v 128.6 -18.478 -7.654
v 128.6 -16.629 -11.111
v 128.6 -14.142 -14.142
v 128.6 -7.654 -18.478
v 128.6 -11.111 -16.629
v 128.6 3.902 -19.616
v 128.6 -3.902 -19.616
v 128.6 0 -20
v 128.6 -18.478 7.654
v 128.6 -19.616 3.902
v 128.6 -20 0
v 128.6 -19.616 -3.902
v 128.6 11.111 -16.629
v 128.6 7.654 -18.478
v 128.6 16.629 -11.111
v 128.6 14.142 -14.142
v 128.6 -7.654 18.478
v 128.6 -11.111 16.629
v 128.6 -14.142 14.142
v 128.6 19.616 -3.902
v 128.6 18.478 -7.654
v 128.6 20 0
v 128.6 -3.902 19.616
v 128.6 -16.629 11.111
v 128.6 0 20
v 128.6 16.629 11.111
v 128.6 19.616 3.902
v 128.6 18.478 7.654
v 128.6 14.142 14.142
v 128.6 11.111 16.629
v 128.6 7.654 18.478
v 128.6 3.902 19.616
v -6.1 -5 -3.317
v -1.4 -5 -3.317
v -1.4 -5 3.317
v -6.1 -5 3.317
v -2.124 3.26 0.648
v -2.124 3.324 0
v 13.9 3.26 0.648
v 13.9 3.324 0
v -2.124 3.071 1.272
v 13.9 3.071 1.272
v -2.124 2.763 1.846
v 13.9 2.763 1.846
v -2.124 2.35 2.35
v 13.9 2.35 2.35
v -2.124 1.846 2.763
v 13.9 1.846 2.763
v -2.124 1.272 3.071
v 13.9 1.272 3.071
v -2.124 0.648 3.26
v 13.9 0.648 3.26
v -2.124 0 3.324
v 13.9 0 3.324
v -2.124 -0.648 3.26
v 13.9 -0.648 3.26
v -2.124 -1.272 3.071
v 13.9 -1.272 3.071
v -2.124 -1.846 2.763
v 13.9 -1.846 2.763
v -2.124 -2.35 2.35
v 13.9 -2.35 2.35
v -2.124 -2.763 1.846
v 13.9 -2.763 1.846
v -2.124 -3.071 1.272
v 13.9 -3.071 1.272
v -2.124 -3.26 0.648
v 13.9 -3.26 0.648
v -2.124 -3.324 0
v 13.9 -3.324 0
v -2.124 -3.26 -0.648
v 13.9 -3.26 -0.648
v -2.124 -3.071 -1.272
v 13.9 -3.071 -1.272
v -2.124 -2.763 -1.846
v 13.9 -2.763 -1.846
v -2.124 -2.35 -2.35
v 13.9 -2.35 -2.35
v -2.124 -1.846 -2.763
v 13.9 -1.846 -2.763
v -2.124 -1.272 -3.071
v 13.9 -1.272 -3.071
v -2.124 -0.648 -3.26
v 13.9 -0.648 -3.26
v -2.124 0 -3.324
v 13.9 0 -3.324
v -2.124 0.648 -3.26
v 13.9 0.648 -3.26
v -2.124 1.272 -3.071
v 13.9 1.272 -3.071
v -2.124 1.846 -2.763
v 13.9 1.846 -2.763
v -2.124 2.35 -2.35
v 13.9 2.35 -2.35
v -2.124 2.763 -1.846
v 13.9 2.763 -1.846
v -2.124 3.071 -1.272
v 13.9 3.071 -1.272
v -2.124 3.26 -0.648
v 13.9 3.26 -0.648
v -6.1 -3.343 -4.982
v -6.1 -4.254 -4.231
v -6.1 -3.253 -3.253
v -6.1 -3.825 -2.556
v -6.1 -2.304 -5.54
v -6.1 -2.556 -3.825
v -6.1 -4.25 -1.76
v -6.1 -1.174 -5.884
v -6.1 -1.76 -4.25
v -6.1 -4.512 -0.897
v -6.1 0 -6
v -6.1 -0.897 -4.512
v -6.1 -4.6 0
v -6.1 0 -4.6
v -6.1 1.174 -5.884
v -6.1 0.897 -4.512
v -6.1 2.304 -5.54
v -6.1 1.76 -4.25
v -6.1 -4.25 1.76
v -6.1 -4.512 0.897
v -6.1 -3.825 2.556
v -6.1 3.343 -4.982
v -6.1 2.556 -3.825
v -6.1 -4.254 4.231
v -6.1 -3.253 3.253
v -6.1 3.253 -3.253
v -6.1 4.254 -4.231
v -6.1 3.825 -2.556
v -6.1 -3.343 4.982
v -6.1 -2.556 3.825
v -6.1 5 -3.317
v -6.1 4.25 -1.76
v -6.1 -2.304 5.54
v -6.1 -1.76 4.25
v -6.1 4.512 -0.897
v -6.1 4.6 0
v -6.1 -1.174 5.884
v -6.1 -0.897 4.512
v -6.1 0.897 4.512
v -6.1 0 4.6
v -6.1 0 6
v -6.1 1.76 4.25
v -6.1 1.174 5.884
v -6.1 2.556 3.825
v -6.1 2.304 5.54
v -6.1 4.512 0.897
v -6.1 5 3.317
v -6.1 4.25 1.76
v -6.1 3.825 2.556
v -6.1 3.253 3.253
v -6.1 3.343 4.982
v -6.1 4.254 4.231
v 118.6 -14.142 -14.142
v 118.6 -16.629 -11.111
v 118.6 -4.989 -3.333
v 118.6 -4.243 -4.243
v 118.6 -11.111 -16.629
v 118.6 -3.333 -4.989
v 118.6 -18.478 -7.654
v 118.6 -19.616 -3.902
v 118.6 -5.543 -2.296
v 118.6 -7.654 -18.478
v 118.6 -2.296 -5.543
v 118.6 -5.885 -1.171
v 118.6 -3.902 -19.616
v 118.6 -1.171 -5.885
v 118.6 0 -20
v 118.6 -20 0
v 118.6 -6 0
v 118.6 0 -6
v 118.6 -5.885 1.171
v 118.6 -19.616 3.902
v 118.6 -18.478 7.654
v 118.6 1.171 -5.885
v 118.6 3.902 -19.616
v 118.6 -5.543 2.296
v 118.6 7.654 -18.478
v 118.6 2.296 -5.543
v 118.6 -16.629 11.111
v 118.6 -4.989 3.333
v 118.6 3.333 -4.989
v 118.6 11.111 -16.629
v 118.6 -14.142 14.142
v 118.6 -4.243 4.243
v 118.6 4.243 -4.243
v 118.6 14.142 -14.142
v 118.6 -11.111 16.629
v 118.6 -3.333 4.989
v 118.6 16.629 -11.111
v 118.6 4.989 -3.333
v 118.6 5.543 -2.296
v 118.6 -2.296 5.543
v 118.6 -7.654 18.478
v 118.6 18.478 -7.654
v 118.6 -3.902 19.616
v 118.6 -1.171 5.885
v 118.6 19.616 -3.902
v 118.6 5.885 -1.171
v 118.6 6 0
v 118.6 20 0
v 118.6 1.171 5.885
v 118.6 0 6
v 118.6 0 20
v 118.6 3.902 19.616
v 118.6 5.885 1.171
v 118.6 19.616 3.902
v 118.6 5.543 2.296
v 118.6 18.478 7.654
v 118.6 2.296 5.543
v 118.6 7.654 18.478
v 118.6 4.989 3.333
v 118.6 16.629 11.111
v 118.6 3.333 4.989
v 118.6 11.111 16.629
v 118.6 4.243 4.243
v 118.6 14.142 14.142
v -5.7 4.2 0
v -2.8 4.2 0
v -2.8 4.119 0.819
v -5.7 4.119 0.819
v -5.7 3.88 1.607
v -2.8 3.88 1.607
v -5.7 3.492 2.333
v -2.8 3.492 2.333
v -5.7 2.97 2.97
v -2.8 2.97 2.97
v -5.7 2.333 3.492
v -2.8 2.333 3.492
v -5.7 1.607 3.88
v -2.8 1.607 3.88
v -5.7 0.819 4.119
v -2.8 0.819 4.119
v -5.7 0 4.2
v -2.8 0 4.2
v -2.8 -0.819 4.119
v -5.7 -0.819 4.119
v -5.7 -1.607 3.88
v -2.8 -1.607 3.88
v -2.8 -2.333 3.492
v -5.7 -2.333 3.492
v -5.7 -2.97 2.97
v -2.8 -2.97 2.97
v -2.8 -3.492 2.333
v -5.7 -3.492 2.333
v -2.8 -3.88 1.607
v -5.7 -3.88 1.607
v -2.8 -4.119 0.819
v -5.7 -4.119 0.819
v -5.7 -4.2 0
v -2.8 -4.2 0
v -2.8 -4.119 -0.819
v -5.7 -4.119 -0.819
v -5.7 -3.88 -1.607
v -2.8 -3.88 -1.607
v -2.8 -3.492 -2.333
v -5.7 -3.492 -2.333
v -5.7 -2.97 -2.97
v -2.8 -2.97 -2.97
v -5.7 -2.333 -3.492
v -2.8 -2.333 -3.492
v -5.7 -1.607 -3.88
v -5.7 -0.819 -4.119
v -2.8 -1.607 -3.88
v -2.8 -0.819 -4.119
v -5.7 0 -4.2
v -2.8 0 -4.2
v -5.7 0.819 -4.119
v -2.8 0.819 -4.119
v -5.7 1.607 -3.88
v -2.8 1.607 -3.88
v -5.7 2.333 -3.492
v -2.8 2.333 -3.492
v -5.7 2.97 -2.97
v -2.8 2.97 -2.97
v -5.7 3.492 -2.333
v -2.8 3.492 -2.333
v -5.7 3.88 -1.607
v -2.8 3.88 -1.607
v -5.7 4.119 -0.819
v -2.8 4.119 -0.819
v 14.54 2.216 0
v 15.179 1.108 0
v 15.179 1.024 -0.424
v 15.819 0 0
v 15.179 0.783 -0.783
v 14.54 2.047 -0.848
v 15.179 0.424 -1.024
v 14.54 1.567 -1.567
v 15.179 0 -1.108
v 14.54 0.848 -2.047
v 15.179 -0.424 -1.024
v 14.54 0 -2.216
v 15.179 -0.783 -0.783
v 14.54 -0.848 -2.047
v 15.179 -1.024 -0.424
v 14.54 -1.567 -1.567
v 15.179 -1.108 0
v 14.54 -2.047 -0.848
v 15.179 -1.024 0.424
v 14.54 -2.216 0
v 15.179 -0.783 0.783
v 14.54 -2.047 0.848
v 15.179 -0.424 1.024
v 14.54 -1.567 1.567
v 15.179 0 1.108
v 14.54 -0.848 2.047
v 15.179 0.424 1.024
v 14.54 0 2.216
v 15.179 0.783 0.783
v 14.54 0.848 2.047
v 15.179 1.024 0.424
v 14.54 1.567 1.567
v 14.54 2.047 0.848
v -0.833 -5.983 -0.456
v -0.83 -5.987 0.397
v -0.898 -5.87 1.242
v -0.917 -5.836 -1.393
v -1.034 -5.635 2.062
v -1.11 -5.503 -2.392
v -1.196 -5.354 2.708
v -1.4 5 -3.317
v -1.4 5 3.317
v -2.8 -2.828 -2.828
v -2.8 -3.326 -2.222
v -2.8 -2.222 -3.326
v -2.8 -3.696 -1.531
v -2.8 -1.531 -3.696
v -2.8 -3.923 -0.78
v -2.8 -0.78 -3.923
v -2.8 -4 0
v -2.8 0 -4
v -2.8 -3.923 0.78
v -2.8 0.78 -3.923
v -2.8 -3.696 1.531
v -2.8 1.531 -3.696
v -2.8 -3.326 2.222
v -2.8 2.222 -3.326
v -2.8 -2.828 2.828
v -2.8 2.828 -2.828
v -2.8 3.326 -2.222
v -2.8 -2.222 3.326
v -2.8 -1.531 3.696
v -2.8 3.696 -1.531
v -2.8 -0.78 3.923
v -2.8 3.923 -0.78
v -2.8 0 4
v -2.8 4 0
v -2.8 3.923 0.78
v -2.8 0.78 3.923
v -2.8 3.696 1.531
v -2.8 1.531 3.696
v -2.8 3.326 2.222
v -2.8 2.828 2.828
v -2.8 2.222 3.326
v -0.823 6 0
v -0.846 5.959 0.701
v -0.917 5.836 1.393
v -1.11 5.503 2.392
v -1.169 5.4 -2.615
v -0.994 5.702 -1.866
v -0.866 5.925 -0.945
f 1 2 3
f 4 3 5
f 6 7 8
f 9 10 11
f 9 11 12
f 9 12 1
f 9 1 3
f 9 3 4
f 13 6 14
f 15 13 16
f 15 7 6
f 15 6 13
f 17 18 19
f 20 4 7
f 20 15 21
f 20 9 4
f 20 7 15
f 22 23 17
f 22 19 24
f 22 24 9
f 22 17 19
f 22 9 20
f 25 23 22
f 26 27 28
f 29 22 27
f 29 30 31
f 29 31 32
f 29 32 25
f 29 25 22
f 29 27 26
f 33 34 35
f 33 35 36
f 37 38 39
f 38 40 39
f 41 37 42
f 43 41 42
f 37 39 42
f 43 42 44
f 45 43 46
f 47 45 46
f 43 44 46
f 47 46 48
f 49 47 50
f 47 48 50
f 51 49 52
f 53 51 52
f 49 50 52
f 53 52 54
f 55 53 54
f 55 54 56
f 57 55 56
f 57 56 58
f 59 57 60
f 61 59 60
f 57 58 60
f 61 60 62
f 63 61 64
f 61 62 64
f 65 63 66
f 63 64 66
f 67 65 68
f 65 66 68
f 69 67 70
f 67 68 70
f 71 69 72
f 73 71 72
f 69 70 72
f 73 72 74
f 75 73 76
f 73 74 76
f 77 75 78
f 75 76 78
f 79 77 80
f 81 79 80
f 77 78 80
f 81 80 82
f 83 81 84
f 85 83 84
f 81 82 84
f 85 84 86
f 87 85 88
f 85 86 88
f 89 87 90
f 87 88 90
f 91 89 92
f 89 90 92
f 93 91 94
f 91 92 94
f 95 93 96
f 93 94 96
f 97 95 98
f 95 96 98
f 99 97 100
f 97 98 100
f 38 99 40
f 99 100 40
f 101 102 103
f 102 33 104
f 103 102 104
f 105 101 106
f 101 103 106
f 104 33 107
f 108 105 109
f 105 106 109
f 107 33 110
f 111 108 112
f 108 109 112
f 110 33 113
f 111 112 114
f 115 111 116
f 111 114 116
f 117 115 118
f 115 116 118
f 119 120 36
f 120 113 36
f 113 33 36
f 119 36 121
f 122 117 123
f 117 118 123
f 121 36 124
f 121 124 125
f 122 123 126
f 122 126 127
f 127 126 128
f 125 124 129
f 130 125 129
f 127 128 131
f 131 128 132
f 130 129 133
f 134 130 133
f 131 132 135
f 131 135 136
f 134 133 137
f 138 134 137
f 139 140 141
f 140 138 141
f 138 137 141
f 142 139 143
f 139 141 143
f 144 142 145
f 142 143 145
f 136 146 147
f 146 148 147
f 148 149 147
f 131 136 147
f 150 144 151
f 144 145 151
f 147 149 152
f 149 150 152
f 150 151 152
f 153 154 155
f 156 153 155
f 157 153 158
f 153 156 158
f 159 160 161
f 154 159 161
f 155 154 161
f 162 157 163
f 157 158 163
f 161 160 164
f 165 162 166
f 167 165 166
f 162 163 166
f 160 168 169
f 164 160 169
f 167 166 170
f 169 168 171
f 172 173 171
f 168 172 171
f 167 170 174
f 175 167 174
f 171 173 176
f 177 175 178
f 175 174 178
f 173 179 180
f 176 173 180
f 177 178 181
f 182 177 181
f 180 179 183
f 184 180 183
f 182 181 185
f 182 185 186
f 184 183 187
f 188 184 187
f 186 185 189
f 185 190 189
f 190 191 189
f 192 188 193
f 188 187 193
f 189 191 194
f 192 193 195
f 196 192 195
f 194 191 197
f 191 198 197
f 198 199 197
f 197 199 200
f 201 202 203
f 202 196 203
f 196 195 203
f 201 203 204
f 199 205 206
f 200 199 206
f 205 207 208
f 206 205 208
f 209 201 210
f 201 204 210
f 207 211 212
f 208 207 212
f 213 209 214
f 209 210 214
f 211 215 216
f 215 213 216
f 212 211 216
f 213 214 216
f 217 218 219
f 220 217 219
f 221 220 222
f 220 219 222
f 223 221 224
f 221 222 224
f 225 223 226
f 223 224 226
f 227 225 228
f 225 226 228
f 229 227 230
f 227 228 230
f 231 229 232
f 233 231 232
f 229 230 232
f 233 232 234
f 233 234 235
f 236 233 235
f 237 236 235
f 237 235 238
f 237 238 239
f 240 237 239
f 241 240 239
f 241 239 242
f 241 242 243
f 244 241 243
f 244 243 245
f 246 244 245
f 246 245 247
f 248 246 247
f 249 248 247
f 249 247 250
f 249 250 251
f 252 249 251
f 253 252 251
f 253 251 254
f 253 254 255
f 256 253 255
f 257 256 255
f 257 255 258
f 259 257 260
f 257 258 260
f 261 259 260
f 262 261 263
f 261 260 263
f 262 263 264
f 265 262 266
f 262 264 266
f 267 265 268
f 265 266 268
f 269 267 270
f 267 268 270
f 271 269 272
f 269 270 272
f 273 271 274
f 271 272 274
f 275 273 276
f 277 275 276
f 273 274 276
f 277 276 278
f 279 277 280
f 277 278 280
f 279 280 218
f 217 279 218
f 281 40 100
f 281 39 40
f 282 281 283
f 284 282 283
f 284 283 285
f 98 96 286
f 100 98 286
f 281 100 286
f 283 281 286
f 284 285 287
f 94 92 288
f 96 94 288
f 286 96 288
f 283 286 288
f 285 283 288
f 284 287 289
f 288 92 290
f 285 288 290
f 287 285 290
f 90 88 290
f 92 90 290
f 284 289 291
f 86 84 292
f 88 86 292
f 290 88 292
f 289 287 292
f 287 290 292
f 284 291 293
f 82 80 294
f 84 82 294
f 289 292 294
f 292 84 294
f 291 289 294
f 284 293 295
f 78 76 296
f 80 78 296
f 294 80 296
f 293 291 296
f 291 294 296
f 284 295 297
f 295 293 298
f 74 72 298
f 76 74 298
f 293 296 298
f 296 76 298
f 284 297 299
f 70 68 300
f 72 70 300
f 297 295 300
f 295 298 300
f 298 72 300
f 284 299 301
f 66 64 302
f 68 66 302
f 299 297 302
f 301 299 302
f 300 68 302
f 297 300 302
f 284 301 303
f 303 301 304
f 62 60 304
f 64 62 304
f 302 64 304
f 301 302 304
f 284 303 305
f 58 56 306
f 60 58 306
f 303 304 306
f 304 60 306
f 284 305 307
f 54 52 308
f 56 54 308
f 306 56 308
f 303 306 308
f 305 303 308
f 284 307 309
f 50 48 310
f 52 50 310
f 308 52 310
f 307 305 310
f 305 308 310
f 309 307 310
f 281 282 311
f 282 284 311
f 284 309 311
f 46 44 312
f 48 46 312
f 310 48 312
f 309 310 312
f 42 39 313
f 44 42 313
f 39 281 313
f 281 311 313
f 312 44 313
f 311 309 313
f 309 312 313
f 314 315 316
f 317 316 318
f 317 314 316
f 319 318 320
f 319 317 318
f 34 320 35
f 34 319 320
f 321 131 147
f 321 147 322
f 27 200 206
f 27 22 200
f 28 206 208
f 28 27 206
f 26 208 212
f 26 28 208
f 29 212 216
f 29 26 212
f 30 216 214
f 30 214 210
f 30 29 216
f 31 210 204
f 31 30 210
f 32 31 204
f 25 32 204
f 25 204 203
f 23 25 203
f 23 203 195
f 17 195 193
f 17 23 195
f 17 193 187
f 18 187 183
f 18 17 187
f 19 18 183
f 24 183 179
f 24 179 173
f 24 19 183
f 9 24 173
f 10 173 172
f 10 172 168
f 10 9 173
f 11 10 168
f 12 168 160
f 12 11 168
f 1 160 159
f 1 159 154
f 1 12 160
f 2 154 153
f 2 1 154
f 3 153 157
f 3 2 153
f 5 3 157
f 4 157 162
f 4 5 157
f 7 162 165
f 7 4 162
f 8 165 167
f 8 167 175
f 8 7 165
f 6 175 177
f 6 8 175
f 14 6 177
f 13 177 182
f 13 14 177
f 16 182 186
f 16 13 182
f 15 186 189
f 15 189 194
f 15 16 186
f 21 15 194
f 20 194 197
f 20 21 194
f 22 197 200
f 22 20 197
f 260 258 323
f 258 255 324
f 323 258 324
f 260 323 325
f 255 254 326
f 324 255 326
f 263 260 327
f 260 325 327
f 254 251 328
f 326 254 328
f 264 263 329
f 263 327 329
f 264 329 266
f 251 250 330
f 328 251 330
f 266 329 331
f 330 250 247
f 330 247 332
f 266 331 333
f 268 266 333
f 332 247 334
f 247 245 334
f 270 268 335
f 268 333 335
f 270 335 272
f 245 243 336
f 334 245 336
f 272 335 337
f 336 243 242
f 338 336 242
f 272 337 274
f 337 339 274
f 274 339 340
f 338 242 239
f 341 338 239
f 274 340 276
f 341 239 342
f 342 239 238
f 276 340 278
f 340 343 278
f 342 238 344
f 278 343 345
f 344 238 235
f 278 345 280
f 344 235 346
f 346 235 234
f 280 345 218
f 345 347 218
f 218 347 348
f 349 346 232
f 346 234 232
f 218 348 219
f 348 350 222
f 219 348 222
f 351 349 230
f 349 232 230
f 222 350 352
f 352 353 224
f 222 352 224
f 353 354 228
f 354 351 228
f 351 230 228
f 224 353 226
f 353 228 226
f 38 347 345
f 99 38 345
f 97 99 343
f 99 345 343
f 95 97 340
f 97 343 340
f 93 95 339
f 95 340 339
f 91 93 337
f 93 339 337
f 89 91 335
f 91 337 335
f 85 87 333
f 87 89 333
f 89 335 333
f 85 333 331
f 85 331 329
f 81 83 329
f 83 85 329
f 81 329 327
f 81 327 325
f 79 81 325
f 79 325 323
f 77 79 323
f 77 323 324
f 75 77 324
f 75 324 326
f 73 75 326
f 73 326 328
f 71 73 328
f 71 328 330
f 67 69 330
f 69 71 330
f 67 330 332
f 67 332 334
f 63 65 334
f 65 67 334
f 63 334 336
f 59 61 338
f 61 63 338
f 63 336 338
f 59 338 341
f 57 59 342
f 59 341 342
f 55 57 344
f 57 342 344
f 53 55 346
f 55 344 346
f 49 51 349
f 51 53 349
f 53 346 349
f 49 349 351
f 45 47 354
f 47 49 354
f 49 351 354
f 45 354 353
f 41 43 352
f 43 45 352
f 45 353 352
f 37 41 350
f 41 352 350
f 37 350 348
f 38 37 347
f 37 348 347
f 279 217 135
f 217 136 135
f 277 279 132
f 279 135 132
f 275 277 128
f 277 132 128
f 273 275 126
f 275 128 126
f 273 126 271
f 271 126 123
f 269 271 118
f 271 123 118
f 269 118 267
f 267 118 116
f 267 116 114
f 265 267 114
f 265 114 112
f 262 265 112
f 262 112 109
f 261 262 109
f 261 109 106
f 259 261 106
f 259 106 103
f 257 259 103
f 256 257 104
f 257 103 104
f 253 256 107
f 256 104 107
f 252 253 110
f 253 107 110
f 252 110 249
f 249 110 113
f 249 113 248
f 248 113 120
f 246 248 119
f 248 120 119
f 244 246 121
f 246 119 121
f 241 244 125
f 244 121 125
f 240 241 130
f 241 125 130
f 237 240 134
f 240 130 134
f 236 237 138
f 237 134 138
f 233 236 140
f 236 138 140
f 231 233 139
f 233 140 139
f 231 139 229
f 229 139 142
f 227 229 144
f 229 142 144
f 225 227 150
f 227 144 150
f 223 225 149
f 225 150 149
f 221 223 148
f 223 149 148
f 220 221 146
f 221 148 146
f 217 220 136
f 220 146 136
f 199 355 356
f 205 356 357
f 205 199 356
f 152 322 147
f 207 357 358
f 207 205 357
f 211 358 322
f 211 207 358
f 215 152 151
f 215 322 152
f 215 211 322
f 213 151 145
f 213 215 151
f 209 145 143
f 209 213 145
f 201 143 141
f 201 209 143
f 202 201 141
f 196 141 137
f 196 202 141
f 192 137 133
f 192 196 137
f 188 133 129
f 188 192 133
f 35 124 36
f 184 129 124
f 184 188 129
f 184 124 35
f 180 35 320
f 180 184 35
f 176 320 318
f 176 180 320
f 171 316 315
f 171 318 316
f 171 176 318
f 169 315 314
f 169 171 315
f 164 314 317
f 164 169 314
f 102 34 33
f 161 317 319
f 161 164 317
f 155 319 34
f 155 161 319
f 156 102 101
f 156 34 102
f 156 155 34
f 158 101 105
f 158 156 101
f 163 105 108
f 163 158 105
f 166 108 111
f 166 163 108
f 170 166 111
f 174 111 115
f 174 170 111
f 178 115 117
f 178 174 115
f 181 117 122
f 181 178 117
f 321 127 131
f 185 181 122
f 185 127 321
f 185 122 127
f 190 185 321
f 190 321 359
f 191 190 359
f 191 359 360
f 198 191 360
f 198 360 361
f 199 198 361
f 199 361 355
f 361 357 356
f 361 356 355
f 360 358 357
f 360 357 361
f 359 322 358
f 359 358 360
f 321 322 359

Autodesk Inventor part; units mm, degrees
sketch "Sketch_1" plane through (0, 0, 0) normal (0, 0, 1) x (1, 0, 0)
  line L0 (128.6, 0) -> (-6.1, 0)
  line L1 (-6.1, 0) -> (-6.1, 6)
  line L2 (-6.1, 6) -> (128.6, 6)
  line L3 (128.6, 6) -> (128.6, 0)
  line L4 (128.6, 0) -> (-6.1, 0)
revolve "Revolution1" add sketch "Sketch_1" angle 360 about axis through (128.6, 0, 0) along (1, 0, 0)
sketch "Sketch_11" plane through (0, 0, 0) normal (0, 0, 1) x (1, 0, 0)
  line L0 (128.6, 0) -> (118.6, 0)
  line L1 (118.6, 0) -> (118.6, 20)
  line L2 (118.6, 20) -> (128.6, 20)
  line L3 (128.6, 20) -> (128.6, 0)
  line L4 (128.6, 0) -> (118.6, 0)
revolve "Revolution2" add sketch "Sketch_11" angle 360 about axis through (128.6, 0, 0) along (1, 0, 0)
sketch "Sketch_20" plane through (0, 0, 0) normal (0, 0, 1) x (1, 0, 0)
  line L0 (-36.2, -16) -> (4.9509, -16)
  line L1 (4.9509, -16) -> (-1.4, -5)
  line L2 (-1.4, -5) -> (-6.1, -5)
  line L3 (-6.1, -5) -> (-6.1, -10)
  line L4 (-6.1, -10) -> (-30.1, -10)
  line L5 (-30.1, -10) -> (-30.1, 10)
  line L6 (-30.1, 10) -> (-6.1, 10)
  line L7 (-6.1, 10) -> (-6.1, 5)
  line L8 (-6.1, 5) -> (-1.4, 5)
  line L9 (-1.4, 5) -> (4.9509, 16)
  line L10 (4.9509, 16) -> (-36.2, 16)
  line L11 (-36.2, 16) -> (-36.2, -16)
extrude "Extrusion1" cut sketch "Sketch_20" along normal mid plane 24
sketch "Sketch_2" plane through (0, 0, 0) normal (0, 0, 1) x (1, 0, 0)
  line L0 (15.8188, 0) -> (-6.1, 0)
  line L1 (-6.1, 0) -> (-6.1, 4.6)
  line L2 (-6.1, 4.6) -> (-5.7, 4.2)
  line L3 (-5.7, 4.2) -> (-2.8, 4.2)
  line L4 (-2.8, 4.2) -> (-2.8, 4)
  line L5 (-2.8, 4) -> (-2.1235, 3.3235)
  line L6 (-2.1235, 3.3235) -> (13.9, 3.3235)
  line L7 (13.9, 3.3235) -> (15.8188, 0)
  line L8 (15.8188, 0) -> (-6.1, 0)
revolve "Revolution3" cut sketch "Sketch_2" angle 360 about axis through (15.8188, 0, 0) along (1, 0, 0)
thread "Thread1" size "M8x1.25" class "6H" standard "ISO Metric profile" length 12.0235
ref_plane "FDT_PIRODACC_F1_XY" through (-6.1, 0, 0) normal (-1, 0, 0) x (0, 1, 0)
ref_plane "FDT_PIRODACC_F1_YZ" through (-6.1, 0, 0) normal (0, 1, 0) x (0, 0, -1)
ref_plane "FDT_PIRODACC_F1_ZX" through (-6.1, 0, 0) normal (0, 0, -1) x (-1, 0, 0)
ref_plane "NUT1_XY" through (-12.6, 0, 0) normal (1, 0, 0) x (0, 0, -1)
ref_plane "NUT1_YZ" through (-12.6, 0, 0) normal (0, 0, -1) x (0, 1, 0)
ref_plane "NUT1_ZX" through (-12.6, 0, 0) normal (0, 1, 0) x (1, 0, 0)
ref_plane "PISTON_XY" through (128.6, 0, 0) normal (1, 0, 0) x (0, 0, -1)
ref_plane "PISTON_YZ" through (128.6, 0, 0) normal (0, 0, -1) x (0, 1, 0)
ref_plane "PISTON_ZX" through (128.6, 0, 0) normal (0, 1, 0) x (1, 0, 0)
properties part number "536288 ADN-100-P-I_(KS)"
